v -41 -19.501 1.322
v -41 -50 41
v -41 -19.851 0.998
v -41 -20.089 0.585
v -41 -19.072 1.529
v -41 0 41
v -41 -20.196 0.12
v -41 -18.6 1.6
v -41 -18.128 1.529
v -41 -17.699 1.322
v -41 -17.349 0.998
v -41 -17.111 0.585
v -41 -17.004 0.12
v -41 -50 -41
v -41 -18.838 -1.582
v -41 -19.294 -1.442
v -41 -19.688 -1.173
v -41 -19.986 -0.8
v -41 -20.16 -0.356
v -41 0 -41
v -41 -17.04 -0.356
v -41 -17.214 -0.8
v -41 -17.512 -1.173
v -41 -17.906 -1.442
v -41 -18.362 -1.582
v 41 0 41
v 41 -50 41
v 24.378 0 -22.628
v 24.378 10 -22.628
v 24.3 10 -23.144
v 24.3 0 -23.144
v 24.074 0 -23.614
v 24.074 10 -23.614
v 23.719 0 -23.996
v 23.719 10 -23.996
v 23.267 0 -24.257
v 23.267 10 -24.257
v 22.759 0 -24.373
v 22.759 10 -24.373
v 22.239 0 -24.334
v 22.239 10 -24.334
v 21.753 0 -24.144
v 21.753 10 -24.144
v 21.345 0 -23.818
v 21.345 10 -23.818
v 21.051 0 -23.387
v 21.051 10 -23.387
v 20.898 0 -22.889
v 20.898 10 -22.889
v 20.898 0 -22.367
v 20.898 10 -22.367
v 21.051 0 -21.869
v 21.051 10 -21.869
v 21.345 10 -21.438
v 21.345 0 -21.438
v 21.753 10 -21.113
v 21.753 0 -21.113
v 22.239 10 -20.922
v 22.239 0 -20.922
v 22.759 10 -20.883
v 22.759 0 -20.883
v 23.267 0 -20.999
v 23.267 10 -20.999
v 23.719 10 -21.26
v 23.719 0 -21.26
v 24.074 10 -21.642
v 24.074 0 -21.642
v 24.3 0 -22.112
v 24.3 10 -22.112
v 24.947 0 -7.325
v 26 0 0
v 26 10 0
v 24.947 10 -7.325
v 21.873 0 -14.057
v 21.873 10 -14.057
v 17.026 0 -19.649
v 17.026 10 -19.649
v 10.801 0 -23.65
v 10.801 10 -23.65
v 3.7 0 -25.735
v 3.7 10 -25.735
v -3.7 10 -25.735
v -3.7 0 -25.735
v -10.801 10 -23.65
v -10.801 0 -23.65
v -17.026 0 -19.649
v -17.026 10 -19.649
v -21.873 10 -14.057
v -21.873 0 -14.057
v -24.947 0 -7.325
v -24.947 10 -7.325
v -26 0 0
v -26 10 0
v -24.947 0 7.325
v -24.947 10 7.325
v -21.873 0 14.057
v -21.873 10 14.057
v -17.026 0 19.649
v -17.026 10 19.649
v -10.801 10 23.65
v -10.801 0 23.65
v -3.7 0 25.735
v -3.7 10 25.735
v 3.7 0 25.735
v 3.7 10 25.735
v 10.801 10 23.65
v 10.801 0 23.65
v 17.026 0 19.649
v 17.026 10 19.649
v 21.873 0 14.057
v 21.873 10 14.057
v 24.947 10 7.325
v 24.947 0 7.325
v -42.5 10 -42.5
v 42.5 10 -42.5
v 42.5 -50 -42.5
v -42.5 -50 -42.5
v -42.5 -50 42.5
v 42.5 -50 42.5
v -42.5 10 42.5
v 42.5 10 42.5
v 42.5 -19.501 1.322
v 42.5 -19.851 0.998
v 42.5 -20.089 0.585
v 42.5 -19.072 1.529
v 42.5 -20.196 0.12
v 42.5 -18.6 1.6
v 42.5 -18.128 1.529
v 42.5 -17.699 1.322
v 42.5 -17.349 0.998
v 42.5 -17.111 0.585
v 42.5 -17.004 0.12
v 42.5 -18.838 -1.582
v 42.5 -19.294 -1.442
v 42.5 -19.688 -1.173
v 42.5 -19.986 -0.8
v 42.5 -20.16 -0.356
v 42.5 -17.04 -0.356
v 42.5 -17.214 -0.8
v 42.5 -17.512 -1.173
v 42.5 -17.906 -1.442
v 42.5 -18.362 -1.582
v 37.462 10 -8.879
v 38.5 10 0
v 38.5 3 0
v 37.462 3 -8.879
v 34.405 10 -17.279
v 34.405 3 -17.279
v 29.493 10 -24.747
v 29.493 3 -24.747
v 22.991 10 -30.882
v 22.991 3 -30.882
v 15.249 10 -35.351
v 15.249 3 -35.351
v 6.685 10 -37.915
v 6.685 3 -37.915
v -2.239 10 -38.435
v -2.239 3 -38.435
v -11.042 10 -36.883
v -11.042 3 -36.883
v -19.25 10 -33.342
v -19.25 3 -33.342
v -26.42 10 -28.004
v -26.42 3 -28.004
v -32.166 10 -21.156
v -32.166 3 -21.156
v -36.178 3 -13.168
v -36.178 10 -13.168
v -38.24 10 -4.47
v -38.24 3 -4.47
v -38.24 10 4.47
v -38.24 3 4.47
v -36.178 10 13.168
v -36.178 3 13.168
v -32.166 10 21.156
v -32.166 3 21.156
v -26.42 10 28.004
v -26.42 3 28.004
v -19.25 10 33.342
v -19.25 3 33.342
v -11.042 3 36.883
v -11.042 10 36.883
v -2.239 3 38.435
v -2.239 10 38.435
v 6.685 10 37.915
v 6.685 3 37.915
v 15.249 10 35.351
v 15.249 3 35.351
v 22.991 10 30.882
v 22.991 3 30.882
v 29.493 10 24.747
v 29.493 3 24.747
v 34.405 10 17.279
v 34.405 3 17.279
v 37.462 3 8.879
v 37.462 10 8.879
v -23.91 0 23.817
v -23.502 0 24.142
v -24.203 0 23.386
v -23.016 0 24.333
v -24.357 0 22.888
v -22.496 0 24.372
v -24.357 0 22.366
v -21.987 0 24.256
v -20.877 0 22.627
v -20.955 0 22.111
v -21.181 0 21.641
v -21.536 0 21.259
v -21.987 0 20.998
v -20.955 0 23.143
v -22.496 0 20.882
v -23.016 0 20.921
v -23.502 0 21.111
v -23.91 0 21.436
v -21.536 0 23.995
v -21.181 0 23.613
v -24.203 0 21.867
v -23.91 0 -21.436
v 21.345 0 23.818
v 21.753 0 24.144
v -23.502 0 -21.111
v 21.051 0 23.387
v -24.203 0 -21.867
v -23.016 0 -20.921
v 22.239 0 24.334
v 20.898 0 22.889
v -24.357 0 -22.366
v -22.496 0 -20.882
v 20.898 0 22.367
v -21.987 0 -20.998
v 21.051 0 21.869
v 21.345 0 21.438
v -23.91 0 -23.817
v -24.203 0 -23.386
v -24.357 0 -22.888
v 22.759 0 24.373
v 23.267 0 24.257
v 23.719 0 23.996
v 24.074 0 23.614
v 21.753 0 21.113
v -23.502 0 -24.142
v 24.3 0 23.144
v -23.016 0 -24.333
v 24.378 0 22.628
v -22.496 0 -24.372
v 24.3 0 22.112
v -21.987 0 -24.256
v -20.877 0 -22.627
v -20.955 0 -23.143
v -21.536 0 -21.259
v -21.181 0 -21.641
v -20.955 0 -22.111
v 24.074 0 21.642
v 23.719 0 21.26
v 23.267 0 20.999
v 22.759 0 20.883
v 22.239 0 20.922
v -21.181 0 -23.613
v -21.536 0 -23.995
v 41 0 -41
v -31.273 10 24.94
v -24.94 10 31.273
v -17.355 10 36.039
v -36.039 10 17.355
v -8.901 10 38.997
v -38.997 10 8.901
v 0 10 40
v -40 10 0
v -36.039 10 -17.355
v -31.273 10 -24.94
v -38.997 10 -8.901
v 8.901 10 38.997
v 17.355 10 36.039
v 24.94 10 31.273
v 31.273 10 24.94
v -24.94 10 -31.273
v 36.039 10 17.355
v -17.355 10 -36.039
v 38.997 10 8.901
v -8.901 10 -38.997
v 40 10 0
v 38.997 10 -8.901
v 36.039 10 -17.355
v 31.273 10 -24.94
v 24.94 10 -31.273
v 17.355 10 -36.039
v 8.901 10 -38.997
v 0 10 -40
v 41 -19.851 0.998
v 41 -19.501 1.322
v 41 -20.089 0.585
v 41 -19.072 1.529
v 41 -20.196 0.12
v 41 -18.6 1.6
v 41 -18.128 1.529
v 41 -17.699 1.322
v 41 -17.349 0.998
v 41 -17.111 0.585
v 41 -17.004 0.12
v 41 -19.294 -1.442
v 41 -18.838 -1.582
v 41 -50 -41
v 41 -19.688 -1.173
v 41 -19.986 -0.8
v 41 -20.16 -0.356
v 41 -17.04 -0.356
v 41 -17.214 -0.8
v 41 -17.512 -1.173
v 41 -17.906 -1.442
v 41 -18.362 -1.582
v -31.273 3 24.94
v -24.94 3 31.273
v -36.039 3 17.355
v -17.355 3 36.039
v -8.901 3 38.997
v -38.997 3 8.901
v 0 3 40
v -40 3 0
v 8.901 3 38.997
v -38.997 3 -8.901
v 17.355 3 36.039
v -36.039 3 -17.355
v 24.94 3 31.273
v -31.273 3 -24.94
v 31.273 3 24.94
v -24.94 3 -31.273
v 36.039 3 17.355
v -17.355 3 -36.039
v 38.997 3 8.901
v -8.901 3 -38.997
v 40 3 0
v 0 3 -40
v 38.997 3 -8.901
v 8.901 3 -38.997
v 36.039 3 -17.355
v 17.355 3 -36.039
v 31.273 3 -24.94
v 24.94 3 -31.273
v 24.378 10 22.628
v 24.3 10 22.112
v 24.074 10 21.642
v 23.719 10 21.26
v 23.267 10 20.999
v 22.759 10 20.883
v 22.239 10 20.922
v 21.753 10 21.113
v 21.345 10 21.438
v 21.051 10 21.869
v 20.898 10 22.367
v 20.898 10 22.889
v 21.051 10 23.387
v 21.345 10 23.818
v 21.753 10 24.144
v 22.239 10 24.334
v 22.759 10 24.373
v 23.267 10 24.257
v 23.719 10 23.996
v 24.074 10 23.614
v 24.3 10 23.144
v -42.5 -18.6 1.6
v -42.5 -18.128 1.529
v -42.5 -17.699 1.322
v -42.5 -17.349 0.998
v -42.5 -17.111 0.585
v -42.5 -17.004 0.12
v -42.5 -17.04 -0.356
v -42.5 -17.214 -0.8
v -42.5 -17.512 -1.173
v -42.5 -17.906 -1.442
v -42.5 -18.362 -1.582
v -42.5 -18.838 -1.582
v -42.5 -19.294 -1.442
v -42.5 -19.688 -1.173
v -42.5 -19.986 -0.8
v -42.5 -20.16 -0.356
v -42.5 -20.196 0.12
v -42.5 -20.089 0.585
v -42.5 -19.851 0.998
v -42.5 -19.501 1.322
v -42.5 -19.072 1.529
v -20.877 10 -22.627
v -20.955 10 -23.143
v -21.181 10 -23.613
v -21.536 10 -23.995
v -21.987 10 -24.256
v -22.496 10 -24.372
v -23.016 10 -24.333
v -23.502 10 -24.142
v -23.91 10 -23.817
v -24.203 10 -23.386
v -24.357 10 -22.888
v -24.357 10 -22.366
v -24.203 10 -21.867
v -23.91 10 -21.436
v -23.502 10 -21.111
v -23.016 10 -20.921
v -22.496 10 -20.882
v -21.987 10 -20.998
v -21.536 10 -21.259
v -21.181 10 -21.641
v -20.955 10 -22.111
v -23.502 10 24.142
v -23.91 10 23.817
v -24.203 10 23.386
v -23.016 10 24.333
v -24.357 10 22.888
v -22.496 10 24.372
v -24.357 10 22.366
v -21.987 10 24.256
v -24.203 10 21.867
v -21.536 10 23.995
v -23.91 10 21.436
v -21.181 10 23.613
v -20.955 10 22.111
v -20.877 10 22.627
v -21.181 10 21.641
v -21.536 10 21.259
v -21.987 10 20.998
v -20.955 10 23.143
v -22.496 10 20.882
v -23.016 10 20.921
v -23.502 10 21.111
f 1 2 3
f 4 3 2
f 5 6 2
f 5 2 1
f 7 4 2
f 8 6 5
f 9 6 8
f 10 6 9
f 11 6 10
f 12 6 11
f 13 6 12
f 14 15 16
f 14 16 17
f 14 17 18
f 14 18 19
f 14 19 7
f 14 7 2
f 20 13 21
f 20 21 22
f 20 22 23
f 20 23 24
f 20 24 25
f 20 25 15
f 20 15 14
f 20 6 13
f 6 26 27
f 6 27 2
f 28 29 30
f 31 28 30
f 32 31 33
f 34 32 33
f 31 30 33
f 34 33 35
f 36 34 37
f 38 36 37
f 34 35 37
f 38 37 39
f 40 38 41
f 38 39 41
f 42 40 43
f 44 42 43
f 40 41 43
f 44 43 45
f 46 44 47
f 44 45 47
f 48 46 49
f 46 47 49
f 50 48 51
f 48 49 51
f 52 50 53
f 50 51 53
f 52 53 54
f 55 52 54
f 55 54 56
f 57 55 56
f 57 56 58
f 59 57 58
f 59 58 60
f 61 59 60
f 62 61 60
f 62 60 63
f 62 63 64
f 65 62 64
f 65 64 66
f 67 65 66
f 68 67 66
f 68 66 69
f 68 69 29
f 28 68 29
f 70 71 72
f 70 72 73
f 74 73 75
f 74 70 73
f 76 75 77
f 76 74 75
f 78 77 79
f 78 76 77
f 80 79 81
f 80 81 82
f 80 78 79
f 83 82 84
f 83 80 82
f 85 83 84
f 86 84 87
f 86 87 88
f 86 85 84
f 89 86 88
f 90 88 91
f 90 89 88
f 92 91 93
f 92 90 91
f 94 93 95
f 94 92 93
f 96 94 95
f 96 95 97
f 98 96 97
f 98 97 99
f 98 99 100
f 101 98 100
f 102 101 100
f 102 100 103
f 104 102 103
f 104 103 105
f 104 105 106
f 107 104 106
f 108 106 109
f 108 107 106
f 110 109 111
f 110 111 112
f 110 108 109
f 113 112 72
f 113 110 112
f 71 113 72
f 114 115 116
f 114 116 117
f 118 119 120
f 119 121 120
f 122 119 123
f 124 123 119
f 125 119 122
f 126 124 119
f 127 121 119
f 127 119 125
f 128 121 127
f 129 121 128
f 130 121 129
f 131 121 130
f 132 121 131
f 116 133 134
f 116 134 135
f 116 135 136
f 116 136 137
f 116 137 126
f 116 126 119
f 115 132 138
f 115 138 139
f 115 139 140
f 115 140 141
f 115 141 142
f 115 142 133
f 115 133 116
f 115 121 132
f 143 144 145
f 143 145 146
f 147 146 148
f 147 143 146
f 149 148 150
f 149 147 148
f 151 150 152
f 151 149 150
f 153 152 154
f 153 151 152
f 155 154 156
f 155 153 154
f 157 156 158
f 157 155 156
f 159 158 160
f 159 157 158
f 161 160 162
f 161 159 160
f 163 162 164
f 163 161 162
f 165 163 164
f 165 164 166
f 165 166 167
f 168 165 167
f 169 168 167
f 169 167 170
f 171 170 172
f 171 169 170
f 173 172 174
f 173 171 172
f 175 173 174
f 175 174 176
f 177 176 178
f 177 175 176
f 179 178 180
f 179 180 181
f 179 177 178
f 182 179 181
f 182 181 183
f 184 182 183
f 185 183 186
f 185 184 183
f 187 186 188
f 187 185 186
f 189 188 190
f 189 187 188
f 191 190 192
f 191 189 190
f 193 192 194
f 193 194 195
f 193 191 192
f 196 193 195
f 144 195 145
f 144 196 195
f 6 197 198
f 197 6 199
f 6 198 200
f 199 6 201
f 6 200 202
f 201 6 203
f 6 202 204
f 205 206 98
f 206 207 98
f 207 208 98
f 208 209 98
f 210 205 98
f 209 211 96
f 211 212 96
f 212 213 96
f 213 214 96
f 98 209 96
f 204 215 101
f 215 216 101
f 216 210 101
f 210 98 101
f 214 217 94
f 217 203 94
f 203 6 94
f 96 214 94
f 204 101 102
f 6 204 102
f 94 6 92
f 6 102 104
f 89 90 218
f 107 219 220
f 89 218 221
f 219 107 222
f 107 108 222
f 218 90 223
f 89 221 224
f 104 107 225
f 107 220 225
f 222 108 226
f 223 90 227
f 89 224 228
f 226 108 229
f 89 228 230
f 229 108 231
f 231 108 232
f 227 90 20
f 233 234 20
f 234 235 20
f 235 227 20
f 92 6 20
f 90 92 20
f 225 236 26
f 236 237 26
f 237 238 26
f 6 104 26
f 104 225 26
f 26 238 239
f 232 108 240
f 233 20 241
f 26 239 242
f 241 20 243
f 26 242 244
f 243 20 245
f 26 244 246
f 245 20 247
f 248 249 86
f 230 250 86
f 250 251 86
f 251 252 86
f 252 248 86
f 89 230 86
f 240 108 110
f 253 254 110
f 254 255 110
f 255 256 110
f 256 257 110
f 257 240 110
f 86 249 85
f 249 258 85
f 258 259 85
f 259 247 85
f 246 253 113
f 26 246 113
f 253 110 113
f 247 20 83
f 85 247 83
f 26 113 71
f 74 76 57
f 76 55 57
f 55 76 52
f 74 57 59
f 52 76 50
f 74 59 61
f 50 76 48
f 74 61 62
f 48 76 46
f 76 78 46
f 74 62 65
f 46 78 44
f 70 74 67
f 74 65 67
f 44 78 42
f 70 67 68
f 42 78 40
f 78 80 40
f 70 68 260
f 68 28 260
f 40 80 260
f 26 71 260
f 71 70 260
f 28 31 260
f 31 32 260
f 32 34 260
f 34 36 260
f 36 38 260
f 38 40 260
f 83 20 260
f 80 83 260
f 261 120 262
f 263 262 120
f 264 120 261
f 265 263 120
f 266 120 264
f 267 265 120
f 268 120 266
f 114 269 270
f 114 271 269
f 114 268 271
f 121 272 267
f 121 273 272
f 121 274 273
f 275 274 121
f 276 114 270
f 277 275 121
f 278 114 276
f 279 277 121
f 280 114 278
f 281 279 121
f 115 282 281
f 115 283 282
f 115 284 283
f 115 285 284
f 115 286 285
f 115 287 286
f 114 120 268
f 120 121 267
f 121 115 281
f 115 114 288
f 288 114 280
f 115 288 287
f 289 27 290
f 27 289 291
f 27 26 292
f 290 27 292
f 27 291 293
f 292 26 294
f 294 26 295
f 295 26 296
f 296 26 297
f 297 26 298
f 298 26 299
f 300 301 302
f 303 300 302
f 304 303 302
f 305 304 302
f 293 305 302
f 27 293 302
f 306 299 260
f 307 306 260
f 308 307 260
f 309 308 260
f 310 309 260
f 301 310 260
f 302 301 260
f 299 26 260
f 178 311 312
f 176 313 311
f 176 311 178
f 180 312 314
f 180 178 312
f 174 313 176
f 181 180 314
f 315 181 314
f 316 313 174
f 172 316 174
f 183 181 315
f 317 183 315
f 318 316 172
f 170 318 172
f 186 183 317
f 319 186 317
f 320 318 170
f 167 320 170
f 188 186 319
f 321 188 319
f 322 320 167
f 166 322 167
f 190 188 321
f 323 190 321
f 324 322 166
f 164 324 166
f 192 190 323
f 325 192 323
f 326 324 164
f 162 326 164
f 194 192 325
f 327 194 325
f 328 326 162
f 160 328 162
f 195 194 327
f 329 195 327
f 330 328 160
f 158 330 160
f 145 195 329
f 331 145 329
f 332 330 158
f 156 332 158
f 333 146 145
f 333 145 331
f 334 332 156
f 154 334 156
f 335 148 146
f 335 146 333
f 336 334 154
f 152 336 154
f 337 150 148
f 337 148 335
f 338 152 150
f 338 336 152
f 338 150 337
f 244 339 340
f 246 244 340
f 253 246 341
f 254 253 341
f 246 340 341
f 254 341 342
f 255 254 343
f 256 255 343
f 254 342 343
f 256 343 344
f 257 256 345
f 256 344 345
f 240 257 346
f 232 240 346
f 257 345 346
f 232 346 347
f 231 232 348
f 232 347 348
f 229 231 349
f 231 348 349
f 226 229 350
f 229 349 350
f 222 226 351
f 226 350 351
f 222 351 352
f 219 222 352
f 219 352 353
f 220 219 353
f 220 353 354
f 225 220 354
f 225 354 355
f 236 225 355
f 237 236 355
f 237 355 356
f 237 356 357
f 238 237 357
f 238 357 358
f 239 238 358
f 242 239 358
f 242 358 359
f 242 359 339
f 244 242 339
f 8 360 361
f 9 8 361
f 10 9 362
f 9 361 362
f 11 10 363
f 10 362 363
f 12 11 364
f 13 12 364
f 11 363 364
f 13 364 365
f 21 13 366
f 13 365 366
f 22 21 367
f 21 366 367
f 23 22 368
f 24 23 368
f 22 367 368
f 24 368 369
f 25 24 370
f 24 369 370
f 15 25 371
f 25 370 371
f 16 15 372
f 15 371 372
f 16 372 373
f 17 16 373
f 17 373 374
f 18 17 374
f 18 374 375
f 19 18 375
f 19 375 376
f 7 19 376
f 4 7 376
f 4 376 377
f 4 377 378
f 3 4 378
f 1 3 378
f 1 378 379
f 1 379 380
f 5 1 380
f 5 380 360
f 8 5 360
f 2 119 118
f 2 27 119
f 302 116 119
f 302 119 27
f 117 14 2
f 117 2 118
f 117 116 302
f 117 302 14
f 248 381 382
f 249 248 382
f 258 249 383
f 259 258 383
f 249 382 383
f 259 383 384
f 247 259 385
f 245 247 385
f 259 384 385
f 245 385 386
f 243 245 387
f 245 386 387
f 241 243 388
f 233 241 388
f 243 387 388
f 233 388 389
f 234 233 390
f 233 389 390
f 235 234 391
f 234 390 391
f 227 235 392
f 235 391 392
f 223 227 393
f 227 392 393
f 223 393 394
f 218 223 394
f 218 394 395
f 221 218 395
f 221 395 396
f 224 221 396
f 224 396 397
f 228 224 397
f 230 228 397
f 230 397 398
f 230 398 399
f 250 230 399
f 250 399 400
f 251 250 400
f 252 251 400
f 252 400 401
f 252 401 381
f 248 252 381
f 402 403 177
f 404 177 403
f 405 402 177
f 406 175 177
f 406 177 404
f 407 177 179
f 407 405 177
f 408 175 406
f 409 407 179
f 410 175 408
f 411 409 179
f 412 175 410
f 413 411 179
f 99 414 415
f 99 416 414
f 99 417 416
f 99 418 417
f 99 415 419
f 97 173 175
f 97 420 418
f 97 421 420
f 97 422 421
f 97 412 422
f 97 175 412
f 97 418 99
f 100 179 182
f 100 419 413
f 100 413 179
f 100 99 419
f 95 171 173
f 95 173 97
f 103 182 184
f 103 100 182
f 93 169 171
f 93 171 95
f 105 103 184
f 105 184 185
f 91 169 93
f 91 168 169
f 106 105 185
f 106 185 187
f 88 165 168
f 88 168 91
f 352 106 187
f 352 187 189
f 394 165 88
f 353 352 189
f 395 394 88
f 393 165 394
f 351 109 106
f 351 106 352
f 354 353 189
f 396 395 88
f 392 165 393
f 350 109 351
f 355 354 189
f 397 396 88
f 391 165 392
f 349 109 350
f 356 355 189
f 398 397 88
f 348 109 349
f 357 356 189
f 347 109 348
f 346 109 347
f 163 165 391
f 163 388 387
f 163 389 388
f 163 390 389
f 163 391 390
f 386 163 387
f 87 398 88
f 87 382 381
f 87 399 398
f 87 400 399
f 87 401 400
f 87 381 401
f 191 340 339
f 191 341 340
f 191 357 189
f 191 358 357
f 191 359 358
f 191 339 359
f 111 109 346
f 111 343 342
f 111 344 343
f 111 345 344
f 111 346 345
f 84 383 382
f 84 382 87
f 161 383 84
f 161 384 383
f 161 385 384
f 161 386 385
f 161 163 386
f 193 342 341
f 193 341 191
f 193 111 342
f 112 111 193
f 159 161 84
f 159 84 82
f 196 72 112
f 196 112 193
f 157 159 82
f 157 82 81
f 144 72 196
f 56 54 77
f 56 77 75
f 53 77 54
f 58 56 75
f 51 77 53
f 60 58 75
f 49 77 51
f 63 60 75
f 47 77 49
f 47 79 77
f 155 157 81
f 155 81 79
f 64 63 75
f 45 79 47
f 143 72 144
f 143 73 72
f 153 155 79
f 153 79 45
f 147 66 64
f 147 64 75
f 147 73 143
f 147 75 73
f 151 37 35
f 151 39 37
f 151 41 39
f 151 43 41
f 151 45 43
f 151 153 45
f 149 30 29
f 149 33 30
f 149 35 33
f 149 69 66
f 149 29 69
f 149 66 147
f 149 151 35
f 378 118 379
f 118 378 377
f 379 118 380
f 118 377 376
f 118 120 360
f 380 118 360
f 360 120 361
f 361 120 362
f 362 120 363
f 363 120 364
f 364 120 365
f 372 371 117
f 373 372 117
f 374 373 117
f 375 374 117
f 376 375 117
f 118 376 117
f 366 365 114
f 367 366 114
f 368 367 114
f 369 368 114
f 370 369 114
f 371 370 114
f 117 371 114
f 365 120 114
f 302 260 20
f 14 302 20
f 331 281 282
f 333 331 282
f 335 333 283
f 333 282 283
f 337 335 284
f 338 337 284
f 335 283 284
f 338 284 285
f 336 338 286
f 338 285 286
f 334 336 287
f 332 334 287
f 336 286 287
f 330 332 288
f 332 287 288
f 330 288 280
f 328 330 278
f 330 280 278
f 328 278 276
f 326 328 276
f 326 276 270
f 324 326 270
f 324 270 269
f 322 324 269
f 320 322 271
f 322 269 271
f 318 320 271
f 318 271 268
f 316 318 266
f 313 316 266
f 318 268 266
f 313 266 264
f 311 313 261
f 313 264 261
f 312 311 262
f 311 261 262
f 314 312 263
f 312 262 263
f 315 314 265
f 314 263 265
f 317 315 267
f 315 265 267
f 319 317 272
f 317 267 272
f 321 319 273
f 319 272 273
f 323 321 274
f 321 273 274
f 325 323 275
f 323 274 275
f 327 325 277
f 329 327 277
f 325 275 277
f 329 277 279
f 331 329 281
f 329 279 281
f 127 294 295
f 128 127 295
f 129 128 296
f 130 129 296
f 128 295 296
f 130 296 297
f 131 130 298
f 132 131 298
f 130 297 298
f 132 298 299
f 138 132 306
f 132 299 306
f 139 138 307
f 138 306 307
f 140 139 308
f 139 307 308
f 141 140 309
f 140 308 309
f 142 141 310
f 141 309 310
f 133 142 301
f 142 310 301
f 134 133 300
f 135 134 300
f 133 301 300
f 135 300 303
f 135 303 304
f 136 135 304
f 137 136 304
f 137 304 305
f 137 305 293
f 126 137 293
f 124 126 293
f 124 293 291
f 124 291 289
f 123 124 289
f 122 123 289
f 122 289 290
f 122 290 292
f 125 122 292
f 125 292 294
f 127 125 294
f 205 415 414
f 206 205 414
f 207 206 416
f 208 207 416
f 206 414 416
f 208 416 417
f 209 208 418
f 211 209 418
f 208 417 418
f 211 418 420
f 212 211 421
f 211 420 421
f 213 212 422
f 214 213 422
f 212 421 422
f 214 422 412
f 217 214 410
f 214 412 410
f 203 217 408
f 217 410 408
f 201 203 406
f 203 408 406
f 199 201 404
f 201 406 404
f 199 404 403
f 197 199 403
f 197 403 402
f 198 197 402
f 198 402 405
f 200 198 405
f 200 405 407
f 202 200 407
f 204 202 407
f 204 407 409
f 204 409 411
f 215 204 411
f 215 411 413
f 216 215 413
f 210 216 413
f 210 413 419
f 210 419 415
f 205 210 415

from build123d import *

# Parameters (mm, degrees)
SKETCH1_W           = 85
SKETCH1_H           = 85
SKETCH1_R           = 26
BOSS_EXTRUDE1_DEPTH = 10
SKETCH2_R           = 1.75
CUT_EXTRUDE1_DEPTH  = 11
SKETCH3_W           = 85
SKETCH3_H           = 85
SKETCH3_W_2         = 82
SKETCH3_H_2         = 82
BOSS_EXTRUDE2_DEPTH = 50
SKETCH4_R           = 1.6
CUT_EXTRUDE2_DEPTH  = 86
SKETCH5_R           = 40
SKETCH5_R_2         = 38.5
CUT_EXTRUDE3_DEPTH  = 7


with BuildPart() as part:
    # Sketch1 → Boss-Extrude1 (new body)
    with BuildSketch(Plane(origin=(0, 0, 0), x_dir=(1, 0, 0), z_dir=(0, 1, 0))):
        Rectangle(SKETCH1_W, SKETCH1_H)
        Circle(SKETCH1_R, mode=Mode.SUBTRACT)
    extrude(amount=BOSS_EXTRUDE1_DEPTH)

    # Sketch2 → Cut-Extrude1 (cut, through all)
    with BuildSketch(Plane(origin=(0, 10, 0), x_dir=(1, 0, 0), z_dir=(0, 1, 0))):
        with Locations((22.628070081, 22.628070081)):
            Circle(SKETCH2_R)
        with Locations((-22.626763915, 22.626763915)):
            Circle(SKETCH2_R)
        with Locations((-22.626763915, -22.626763915)):
            Circle(SKETCH2_R)
        with Locations((22.628070081, -22.628070081)):
            Circle(SKETCH2_R)
    extrude(amount=-CUT_EXTRUDE1_DEPTH, mode=Mode.SUBTRACT)

    # Sketch3 → Boss-Extrude2 (add)
    with BuildSketch(Plane(origin=(0, 0, 0), x_dir=(-1, 0, 0), z_dir=(0, -1, 0))):
        Rectangle(SKETCH3_W, SKETCH3_H)
        Rectangle(SKETCH3_W_2, SKETCH3_H_2, mode=Mode.SUBTRACT)
    extrude(amount=BOSS_EXTRUDE2_DEPTH)

    # Sketch4 → Cut-Extrude2 (cut, through all)
    with BuildSketch(Plane.ZY.offset(42.5)):
        with Locations((0, -18.6)):
            Circle(SKETCH4_R)
    extrude(amount=-CUT_EXTRUDE2_DEPTH, mode=Mode.SUBTRACT)

    # Sketch5 → Cut-Extrude3 (cut)
    with BuildSketch(Plane(origin=(0, 10, 0), x_dir=(1, 0, 0), z_dir=(0, 1, 0))):
        Circle(SKETCH5_R)
        Circle(SKETCH5_R_2, mode=Mode.SUBTRACT)
    extrude(amount=-CUT_EXTRUDE3_DEPTH, mode=Mode.SUBTRACT)


solid = part.part
